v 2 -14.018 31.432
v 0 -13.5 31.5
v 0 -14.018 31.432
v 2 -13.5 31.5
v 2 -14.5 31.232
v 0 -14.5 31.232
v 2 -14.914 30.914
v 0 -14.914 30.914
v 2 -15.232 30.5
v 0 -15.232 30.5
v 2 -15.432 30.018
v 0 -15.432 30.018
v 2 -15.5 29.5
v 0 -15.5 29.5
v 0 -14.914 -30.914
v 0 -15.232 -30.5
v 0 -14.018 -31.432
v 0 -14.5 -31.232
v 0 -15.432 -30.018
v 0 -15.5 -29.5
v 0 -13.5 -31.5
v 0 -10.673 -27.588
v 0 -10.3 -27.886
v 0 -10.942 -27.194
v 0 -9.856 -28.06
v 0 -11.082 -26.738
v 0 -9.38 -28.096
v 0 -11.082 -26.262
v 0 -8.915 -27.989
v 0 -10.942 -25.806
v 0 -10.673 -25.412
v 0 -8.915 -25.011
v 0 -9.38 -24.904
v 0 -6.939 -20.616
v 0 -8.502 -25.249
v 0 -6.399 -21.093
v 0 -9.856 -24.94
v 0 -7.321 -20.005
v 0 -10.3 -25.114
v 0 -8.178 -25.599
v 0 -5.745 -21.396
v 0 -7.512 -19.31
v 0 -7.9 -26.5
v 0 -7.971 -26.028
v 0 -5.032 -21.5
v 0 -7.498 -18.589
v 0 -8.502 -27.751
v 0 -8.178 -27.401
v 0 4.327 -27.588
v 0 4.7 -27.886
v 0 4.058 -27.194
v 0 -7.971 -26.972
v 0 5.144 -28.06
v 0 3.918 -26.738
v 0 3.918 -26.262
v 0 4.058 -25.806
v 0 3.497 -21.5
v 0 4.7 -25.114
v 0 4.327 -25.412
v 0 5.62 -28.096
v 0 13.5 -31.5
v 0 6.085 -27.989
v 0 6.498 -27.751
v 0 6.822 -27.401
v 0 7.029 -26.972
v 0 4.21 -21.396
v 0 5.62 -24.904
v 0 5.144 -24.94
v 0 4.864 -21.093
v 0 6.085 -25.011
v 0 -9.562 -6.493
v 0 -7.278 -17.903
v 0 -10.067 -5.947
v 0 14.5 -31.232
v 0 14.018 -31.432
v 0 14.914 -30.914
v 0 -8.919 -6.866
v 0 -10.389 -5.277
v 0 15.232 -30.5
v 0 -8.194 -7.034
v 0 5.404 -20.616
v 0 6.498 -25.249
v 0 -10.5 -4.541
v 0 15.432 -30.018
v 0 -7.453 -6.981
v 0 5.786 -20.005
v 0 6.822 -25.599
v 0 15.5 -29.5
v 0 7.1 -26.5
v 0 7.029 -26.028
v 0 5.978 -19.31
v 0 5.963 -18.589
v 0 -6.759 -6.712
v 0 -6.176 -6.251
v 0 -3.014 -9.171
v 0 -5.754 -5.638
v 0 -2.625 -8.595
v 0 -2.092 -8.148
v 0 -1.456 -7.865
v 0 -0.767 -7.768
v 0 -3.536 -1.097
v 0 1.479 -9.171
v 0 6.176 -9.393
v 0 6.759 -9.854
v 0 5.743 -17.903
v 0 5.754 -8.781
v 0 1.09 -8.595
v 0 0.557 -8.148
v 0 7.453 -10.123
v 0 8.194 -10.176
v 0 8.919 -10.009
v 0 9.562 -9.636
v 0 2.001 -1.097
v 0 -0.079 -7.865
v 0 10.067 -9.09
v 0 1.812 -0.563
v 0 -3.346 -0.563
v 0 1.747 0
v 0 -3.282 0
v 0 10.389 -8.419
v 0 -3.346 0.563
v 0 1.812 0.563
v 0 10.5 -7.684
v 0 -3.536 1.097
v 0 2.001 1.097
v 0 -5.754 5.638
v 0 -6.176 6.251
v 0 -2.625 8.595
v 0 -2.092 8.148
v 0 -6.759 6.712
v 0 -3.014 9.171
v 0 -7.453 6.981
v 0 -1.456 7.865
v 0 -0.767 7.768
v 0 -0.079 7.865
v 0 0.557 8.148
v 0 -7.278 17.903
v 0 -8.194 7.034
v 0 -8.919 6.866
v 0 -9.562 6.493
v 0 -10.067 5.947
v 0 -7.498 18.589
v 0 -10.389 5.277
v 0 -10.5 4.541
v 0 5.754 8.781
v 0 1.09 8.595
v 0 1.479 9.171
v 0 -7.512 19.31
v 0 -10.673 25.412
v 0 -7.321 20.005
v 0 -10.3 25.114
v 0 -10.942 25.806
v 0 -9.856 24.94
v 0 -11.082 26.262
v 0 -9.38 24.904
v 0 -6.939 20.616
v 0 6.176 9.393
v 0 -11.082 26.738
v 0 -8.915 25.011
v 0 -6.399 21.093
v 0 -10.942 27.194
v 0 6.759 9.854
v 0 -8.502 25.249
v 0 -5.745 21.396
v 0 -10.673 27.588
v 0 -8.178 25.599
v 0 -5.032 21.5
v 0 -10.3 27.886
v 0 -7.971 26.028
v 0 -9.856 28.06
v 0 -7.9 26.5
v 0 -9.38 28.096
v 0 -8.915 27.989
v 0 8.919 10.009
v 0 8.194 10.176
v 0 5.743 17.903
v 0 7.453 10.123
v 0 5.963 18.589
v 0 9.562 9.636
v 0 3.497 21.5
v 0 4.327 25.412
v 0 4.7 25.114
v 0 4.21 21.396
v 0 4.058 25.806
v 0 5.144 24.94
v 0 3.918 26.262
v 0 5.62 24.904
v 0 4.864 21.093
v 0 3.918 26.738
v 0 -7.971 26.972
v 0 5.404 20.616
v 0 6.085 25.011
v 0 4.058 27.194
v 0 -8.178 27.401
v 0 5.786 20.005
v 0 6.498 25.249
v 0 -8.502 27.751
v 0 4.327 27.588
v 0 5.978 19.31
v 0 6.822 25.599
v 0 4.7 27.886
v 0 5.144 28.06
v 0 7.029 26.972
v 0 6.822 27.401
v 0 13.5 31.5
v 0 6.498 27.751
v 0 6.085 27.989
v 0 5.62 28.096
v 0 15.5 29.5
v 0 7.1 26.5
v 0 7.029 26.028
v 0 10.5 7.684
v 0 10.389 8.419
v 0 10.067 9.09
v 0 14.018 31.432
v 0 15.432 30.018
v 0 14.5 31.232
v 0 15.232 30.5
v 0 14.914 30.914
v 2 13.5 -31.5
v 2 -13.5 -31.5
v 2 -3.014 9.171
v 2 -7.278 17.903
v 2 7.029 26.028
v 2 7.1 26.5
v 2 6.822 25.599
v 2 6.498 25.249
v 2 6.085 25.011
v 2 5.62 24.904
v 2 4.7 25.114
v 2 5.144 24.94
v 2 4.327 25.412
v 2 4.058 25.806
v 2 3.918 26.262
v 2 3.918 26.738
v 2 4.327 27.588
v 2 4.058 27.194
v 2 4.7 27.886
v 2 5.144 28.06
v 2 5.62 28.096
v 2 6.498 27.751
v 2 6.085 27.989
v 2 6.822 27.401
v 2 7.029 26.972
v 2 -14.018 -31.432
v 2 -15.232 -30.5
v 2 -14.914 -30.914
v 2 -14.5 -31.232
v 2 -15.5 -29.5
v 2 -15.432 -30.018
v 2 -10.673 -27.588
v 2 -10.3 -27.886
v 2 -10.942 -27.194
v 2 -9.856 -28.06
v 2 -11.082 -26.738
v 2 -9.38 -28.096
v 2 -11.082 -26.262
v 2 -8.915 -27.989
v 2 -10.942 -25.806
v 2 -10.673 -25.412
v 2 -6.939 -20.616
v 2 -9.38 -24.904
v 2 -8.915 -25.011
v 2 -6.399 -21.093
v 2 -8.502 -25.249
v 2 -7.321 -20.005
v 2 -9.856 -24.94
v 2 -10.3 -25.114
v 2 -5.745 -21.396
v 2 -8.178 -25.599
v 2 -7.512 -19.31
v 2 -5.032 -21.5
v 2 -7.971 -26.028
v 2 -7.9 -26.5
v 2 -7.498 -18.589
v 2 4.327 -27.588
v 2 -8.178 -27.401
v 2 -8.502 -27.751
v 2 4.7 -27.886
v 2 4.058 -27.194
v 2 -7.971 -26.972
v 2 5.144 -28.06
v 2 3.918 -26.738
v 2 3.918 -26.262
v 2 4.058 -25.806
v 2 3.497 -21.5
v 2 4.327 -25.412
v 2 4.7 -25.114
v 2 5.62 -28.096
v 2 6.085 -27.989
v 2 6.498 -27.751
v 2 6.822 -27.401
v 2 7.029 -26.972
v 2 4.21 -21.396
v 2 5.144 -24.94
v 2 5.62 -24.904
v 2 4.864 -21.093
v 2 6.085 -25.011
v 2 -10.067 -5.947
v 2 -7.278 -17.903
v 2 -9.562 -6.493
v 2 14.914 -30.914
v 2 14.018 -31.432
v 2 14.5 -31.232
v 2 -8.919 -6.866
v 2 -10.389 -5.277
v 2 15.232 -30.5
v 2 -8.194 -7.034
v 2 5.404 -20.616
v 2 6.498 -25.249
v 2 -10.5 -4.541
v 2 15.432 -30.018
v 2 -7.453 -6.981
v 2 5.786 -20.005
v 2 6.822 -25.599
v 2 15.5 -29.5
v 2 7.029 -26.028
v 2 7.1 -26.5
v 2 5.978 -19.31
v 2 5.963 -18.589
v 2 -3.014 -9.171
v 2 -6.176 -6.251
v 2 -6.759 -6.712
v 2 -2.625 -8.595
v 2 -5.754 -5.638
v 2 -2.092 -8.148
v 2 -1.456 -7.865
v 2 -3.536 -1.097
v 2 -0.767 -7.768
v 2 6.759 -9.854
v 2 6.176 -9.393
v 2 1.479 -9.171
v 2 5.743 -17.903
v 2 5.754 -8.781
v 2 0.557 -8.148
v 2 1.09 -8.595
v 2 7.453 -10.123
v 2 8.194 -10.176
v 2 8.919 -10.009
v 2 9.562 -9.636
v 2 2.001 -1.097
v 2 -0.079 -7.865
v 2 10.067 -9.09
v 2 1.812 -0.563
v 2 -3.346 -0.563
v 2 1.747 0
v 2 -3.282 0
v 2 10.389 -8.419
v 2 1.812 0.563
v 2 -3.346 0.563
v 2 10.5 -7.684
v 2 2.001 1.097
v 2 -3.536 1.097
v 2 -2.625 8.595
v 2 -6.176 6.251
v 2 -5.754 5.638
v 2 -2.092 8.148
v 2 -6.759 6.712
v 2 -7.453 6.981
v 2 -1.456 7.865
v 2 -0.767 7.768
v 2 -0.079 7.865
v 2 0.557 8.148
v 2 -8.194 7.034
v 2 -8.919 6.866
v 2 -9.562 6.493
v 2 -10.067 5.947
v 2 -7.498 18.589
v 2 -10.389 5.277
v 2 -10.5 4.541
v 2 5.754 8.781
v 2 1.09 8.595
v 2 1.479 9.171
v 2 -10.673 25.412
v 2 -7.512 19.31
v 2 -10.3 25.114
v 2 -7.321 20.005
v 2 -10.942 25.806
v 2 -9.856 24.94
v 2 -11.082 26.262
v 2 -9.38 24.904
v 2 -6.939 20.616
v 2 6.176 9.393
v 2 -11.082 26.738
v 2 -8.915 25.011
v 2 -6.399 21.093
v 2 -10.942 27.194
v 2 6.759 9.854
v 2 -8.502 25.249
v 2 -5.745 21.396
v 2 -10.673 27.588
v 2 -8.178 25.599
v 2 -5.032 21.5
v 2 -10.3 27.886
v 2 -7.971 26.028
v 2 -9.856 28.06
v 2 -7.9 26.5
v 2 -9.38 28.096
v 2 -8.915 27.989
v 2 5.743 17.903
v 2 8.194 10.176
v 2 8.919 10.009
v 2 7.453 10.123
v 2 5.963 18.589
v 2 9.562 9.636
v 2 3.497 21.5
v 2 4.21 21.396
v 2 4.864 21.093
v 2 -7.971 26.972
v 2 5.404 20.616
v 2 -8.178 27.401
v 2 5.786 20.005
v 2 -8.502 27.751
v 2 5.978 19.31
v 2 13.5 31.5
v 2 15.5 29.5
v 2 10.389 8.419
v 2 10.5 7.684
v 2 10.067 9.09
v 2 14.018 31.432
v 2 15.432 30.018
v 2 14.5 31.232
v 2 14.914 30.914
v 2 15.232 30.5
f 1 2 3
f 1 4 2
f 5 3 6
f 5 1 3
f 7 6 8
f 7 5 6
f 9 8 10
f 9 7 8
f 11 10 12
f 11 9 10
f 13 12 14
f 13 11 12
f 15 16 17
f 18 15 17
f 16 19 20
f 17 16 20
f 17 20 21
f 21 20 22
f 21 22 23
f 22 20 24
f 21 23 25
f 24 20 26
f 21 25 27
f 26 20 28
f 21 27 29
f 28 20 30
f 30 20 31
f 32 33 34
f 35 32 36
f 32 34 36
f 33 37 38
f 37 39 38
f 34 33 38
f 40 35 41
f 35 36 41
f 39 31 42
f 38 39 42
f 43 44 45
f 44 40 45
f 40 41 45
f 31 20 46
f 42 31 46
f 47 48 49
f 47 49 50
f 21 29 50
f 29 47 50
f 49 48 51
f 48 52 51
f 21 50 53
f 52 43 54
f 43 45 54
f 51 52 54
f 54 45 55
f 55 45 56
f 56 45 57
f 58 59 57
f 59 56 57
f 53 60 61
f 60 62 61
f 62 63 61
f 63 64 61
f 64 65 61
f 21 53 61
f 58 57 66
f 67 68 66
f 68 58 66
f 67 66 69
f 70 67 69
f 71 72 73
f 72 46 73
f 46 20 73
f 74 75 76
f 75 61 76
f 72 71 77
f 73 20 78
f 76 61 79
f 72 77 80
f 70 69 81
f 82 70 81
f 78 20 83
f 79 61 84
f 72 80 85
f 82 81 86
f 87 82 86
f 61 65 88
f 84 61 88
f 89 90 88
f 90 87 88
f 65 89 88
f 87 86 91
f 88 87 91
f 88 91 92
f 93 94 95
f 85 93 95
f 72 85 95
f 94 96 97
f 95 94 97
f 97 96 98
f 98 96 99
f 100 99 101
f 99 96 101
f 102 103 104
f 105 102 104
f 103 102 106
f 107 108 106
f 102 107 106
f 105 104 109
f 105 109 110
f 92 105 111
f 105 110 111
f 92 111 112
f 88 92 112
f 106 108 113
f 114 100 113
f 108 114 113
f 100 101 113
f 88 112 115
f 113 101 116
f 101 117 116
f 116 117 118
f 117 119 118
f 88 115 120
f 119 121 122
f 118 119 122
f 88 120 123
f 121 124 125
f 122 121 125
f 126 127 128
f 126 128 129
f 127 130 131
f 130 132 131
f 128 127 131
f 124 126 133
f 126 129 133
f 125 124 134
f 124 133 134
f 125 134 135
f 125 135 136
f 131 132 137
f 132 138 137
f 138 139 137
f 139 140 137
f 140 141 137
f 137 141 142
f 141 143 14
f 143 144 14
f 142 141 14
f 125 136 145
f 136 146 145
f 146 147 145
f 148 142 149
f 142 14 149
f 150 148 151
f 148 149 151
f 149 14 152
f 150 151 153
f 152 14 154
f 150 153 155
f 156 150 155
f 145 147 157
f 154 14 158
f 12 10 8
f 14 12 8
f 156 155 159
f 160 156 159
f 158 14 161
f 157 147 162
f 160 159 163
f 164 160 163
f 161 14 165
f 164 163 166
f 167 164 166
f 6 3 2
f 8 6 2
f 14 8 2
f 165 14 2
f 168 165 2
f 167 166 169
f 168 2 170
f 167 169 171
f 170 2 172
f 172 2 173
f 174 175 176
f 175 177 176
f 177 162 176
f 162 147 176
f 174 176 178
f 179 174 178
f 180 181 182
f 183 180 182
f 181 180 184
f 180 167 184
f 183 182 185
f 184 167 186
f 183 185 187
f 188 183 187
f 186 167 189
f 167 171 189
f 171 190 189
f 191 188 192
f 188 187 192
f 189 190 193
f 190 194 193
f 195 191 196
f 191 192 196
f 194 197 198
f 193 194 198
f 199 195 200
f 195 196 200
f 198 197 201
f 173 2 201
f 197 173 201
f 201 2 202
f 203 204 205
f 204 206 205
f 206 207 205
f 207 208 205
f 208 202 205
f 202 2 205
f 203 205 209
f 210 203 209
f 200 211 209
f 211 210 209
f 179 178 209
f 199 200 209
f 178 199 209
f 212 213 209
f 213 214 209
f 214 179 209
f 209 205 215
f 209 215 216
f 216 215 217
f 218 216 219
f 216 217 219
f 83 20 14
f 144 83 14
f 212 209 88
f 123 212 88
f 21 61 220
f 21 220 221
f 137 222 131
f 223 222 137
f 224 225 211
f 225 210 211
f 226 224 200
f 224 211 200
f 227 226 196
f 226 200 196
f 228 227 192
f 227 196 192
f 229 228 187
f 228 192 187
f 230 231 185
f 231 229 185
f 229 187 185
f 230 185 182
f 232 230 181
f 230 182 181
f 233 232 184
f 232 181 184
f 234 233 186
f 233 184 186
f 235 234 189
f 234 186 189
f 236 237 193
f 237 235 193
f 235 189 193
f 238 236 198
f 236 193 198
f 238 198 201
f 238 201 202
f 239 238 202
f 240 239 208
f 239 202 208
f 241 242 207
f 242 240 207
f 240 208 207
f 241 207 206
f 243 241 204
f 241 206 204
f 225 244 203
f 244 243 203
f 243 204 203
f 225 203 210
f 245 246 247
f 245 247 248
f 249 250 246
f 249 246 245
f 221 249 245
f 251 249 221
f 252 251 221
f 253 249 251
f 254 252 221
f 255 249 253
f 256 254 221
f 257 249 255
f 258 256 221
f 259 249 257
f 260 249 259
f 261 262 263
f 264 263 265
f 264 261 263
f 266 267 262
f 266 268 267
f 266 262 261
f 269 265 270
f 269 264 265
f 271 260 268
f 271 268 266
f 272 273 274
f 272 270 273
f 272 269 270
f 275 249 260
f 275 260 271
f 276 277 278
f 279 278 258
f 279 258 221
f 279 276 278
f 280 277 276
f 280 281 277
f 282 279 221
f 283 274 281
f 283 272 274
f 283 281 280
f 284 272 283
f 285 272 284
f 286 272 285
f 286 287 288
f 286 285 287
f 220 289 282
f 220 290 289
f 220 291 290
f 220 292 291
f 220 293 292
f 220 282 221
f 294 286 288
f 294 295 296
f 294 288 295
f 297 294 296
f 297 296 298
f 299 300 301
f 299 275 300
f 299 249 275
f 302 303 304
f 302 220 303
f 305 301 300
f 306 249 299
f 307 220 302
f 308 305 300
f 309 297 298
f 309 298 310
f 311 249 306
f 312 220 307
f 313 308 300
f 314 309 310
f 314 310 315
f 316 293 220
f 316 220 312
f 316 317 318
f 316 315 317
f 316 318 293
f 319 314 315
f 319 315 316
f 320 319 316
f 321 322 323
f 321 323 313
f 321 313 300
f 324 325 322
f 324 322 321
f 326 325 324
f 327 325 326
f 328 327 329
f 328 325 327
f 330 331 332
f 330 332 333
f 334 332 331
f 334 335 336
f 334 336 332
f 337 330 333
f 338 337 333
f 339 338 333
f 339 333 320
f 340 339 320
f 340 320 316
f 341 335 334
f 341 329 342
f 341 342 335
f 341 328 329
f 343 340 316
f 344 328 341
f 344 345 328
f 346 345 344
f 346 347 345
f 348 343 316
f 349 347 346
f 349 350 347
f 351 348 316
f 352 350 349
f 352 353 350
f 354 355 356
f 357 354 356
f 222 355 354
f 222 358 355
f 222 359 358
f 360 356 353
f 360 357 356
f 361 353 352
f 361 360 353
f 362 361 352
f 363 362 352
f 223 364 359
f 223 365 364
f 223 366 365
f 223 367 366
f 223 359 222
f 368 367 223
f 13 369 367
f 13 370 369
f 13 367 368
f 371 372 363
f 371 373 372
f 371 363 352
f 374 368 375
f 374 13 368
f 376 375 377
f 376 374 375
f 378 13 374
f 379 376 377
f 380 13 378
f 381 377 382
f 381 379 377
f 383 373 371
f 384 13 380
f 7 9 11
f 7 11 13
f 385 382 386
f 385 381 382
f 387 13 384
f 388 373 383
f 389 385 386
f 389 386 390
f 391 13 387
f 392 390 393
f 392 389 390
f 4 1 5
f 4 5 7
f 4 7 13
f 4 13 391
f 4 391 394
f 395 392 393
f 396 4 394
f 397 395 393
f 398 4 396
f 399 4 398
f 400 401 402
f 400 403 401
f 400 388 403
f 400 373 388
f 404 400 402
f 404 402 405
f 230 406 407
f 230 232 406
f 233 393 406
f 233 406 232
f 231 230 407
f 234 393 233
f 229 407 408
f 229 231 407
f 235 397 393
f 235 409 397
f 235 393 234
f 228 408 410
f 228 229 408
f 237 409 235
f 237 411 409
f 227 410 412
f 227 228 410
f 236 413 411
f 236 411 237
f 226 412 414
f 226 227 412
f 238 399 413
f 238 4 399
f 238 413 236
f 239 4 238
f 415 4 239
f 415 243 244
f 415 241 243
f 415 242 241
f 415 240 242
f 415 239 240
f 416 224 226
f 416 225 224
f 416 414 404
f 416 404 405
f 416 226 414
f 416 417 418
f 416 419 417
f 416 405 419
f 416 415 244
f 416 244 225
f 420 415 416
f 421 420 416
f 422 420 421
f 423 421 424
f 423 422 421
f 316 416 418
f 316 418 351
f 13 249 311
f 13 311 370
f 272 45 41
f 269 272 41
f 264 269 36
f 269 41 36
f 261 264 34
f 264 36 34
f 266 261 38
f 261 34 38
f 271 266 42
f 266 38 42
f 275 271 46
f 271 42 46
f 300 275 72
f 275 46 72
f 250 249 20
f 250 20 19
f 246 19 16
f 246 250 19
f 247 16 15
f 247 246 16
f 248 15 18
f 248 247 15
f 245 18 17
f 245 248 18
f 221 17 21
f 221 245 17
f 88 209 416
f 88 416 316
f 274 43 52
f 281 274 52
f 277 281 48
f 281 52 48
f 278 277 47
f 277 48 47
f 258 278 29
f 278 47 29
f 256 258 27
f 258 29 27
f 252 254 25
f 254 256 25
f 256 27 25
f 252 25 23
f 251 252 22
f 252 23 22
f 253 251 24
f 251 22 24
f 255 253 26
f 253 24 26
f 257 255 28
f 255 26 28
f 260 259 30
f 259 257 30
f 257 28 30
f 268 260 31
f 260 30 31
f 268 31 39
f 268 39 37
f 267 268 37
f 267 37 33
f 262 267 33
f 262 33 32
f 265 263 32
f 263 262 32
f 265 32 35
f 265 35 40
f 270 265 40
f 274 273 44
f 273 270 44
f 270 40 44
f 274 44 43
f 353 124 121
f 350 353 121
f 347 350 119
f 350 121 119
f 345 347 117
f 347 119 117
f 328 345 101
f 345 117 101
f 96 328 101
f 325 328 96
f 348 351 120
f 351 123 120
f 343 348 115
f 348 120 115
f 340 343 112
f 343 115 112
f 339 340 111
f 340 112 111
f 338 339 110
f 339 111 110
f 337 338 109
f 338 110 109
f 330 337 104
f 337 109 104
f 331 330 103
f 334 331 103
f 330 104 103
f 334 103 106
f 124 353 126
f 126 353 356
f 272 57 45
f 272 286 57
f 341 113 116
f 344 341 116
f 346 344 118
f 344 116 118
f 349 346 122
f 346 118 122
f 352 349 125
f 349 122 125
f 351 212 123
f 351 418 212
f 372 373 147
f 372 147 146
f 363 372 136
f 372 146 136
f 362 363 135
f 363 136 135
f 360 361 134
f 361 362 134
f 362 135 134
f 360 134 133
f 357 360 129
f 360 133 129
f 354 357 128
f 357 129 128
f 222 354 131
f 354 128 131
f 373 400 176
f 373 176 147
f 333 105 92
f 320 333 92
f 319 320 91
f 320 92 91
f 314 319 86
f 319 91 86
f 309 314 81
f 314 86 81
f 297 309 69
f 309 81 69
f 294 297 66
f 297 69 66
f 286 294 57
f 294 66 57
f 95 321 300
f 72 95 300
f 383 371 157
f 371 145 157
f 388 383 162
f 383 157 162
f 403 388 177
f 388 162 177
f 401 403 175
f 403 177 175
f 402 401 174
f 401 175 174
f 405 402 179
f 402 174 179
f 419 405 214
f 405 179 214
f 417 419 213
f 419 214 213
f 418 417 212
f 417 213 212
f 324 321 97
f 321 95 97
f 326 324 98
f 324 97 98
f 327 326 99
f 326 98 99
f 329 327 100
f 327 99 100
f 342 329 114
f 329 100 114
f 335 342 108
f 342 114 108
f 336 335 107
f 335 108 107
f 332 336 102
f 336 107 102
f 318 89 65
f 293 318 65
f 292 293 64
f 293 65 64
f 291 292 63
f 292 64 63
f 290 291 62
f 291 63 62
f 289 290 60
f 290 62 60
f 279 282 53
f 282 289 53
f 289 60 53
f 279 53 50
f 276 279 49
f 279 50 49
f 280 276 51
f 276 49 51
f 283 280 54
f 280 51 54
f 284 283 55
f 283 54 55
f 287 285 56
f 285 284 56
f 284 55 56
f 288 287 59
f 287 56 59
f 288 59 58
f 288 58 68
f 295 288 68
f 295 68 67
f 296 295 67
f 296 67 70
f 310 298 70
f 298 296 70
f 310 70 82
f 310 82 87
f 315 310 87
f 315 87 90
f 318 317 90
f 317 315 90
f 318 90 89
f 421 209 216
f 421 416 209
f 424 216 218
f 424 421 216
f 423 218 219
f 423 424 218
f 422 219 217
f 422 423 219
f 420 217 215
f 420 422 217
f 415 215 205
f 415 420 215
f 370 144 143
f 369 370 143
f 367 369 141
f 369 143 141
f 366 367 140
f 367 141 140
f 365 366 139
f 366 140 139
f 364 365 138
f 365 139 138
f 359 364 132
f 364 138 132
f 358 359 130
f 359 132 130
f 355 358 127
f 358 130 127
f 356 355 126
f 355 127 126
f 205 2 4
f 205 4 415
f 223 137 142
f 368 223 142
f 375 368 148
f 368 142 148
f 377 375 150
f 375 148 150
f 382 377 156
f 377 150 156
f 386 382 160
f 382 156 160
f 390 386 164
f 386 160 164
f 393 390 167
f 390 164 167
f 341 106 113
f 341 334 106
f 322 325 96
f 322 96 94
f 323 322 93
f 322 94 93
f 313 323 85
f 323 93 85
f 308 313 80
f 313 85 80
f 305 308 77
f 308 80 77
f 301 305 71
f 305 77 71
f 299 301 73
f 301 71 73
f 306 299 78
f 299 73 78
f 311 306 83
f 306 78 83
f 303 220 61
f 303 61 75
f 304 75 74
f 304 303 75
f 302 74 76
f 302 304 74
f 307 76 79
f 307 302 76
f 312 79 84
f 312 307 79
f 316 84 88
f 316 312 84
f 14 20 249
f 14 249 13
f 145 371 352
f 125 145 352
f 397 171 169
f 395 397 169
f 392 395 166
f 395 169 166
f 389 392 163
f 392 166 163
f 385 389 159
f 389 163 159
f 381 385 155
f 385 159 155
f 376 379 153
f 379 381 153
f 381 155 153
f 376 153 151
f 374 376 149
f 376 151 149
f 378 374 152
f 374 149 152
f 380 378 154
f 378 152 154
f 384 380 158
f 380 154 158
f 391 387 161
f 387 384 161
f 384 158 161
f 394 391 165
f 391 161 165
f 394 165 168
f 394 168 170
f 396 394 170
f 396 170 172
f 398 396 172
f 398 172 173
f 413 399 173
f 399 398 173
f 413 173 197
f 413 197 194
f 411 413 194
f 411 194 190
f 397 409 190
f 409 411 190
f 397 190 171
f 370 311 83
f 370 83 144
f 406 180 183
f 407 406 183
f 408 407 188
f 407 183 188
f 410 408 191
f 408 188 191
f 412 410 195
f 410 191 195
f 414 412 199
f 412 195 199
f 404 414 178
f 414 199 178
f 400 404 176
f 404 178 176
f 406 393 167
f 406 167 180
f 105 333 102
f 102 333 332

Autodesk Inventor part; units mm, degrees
ref_plane "YZ Plane" through (0, 0, 0) normal (1, 0, 0) x (0, 1, 0)
ref_plane "XZ Plane" through (0, 0, 0) normal (0, 1, 0) x (-1, 0, 0)
ref_plane "XY Plane" through (0, 0, 0) normal (0, 0, 1) x (1, 0, 0)
sketch "Sketch1" plane through (0, 0, 0) normal (1, 0, 0) x (0, 1, 0)
  line L0 (-15.5, 31.5) -> (15.5, 31.5)
  line L1 (15.5, 31.5) -> (15.5, -31.5)
  line L2 (15.5, -31.5) -> (-15.5, -31.5)
  line L3 (-15.5, -31.5) -> (-15.5, 31.5)
  line L4 (-15.5, 31.5) -> (15.5, -31.5) construction
  line L5 (15.5, 31.5) -> (-15.5, -31.5) construction
  circle A0 centre (5.5, 26.5) radius 1.6
  circle A1 centre (5.5, -26.5) radius 1.6
  circle A2 centre (-9.5, -26.5) radius 1.6
  circle A3 centre (-9.5, 26.5) radius 1.6
  circle A4 centre (0, 10.5) radius 6
  circle A5 centre (0, -10.5) radius 6
  point P0 (0, 0)
  point P1 (-9.5, 26.5)
  point P2 (5.5, -26.5)
  point P3 (-9.5, -16)
  dimension "d0" = 63
  dimension "d1" = 31
  dimension "d2" = 5
  dimension "d3" = 10
  dimension "d5" = 15
  dimension "d6" = 5
  dimension "d7" = 3.2
  dimension "d8" = 3.2
  dimension "d9" = 3.2
  dimension "d10" = 3.2
  dimension "d15" = 5
  dimension "d16" = 5
  dimension "d17" = 5
  dimension "d18" = 21
  dimension "d19" = 21
  dimension "d20" = 12
  dimension "d21" = 12
extrude "Extrusion1" add sketch "Sketch1" along normal blind 2 contours L0 L1 L2 L3 | A4 | A5
fillet "Fillet1" radius 2 4 edges at (1, 15.5, 31.5) (1, -15.5, 31.5) (1, -15.5, -31.5) (1, 15.5, -31.5)
sketch "Sketch2" plane through (2, 0, 0) normal (1, 0, 0) x (0, 0, -1)
  line L0 (21.5, -10.5) -> (-21.5, -10.5)
  line L1 (-21.5, -10.5) -> (-21.5, 10.5)
  line L2 (-21.5, 10.5) -> (21.5, 10.5)
  line L3 (21.5, 10.5) -> (21.5, -10.5)
  line L4 (21.5, -10.5) -> (-21.5, 10.5) construction
  line L5 (-21.5, -10.5) -> (21.5, 10.5) construction
  line L6 (29.5, 15.5) -> (-29.5, 15.5) projected
  line L7 (-29.5, -15.5) -> (29.5, -15.5) projected
  line L8 (31.5, -13.5) -> (31.5, 13.5) projected
  line L9 (-31.5, 13.5) -> (-31.5, -13.5) projected
  line L10 (-21.5, 10.5) -> (21.5, -10.5)
  line L11 (21.5, 10.5) -> (-21.5, -10.5)
  line L12 (-21.5, 7.5) -> (15.3571, -10.5)
  line L13 (-18.5, 10.5) -> (21.5, -9.0349)
  line L14 (0, 10.5) -> (0, 6.4862)
  line L15 (21.5, 7.5) -> (-15.3571, -10.5)
  line L16 (18.5, 10.5) -> (-21.5, -9.0349)
  point P0 (0, 0)
  point P1 (0, -3)
  point P2 (-15.3571, -10.5)
  point P3 (21.5, 7.5)
  point P4 (4.5714, -0.7674)
  point P5 (0, 1.4651)
  point P6 (18.5, 10.5)
  point P7 (-21.5, -9.0349)
  point P8 (-4.5714, -0.7674)
  dimension "d22" = 5
  dimension "d23" = 5
  dimension "d24" = 10
  dimension "d25" = 10
  dimension "d26" = 3
  dimension "d27" = 3
  dimension "d31" = 180
extrude "Extrusion2" cut sketch "Sketch2" against normal blind 2 contours L0 L15 L12 | L13 L15 L3 | L1 L12 L16 | L16 L13 L2
fillet "Fillet2" radius 2.5 12 edges at (1, 7.5, 21.5) (1, 10.5, 18.5) (1, 10.5, -18.5) (1, 7.5, -21.5) (1, -9.0349, -21.5) (1, -10.5, -15.3571) (1, -3, 0) (1, 1.4651, 0) (1, -0.7674, -4.5714) (1, -0.7674, 4.5714) (1, -10.5, 15.3571) (1, -9.0349, 21.5)
equation "\"d15\" = d2"
equation "\"d16\" = d6"
equation "\"d17\" = d6"
properties part number "2mm_double_for_pulley" material "アルミニウム 6061"
